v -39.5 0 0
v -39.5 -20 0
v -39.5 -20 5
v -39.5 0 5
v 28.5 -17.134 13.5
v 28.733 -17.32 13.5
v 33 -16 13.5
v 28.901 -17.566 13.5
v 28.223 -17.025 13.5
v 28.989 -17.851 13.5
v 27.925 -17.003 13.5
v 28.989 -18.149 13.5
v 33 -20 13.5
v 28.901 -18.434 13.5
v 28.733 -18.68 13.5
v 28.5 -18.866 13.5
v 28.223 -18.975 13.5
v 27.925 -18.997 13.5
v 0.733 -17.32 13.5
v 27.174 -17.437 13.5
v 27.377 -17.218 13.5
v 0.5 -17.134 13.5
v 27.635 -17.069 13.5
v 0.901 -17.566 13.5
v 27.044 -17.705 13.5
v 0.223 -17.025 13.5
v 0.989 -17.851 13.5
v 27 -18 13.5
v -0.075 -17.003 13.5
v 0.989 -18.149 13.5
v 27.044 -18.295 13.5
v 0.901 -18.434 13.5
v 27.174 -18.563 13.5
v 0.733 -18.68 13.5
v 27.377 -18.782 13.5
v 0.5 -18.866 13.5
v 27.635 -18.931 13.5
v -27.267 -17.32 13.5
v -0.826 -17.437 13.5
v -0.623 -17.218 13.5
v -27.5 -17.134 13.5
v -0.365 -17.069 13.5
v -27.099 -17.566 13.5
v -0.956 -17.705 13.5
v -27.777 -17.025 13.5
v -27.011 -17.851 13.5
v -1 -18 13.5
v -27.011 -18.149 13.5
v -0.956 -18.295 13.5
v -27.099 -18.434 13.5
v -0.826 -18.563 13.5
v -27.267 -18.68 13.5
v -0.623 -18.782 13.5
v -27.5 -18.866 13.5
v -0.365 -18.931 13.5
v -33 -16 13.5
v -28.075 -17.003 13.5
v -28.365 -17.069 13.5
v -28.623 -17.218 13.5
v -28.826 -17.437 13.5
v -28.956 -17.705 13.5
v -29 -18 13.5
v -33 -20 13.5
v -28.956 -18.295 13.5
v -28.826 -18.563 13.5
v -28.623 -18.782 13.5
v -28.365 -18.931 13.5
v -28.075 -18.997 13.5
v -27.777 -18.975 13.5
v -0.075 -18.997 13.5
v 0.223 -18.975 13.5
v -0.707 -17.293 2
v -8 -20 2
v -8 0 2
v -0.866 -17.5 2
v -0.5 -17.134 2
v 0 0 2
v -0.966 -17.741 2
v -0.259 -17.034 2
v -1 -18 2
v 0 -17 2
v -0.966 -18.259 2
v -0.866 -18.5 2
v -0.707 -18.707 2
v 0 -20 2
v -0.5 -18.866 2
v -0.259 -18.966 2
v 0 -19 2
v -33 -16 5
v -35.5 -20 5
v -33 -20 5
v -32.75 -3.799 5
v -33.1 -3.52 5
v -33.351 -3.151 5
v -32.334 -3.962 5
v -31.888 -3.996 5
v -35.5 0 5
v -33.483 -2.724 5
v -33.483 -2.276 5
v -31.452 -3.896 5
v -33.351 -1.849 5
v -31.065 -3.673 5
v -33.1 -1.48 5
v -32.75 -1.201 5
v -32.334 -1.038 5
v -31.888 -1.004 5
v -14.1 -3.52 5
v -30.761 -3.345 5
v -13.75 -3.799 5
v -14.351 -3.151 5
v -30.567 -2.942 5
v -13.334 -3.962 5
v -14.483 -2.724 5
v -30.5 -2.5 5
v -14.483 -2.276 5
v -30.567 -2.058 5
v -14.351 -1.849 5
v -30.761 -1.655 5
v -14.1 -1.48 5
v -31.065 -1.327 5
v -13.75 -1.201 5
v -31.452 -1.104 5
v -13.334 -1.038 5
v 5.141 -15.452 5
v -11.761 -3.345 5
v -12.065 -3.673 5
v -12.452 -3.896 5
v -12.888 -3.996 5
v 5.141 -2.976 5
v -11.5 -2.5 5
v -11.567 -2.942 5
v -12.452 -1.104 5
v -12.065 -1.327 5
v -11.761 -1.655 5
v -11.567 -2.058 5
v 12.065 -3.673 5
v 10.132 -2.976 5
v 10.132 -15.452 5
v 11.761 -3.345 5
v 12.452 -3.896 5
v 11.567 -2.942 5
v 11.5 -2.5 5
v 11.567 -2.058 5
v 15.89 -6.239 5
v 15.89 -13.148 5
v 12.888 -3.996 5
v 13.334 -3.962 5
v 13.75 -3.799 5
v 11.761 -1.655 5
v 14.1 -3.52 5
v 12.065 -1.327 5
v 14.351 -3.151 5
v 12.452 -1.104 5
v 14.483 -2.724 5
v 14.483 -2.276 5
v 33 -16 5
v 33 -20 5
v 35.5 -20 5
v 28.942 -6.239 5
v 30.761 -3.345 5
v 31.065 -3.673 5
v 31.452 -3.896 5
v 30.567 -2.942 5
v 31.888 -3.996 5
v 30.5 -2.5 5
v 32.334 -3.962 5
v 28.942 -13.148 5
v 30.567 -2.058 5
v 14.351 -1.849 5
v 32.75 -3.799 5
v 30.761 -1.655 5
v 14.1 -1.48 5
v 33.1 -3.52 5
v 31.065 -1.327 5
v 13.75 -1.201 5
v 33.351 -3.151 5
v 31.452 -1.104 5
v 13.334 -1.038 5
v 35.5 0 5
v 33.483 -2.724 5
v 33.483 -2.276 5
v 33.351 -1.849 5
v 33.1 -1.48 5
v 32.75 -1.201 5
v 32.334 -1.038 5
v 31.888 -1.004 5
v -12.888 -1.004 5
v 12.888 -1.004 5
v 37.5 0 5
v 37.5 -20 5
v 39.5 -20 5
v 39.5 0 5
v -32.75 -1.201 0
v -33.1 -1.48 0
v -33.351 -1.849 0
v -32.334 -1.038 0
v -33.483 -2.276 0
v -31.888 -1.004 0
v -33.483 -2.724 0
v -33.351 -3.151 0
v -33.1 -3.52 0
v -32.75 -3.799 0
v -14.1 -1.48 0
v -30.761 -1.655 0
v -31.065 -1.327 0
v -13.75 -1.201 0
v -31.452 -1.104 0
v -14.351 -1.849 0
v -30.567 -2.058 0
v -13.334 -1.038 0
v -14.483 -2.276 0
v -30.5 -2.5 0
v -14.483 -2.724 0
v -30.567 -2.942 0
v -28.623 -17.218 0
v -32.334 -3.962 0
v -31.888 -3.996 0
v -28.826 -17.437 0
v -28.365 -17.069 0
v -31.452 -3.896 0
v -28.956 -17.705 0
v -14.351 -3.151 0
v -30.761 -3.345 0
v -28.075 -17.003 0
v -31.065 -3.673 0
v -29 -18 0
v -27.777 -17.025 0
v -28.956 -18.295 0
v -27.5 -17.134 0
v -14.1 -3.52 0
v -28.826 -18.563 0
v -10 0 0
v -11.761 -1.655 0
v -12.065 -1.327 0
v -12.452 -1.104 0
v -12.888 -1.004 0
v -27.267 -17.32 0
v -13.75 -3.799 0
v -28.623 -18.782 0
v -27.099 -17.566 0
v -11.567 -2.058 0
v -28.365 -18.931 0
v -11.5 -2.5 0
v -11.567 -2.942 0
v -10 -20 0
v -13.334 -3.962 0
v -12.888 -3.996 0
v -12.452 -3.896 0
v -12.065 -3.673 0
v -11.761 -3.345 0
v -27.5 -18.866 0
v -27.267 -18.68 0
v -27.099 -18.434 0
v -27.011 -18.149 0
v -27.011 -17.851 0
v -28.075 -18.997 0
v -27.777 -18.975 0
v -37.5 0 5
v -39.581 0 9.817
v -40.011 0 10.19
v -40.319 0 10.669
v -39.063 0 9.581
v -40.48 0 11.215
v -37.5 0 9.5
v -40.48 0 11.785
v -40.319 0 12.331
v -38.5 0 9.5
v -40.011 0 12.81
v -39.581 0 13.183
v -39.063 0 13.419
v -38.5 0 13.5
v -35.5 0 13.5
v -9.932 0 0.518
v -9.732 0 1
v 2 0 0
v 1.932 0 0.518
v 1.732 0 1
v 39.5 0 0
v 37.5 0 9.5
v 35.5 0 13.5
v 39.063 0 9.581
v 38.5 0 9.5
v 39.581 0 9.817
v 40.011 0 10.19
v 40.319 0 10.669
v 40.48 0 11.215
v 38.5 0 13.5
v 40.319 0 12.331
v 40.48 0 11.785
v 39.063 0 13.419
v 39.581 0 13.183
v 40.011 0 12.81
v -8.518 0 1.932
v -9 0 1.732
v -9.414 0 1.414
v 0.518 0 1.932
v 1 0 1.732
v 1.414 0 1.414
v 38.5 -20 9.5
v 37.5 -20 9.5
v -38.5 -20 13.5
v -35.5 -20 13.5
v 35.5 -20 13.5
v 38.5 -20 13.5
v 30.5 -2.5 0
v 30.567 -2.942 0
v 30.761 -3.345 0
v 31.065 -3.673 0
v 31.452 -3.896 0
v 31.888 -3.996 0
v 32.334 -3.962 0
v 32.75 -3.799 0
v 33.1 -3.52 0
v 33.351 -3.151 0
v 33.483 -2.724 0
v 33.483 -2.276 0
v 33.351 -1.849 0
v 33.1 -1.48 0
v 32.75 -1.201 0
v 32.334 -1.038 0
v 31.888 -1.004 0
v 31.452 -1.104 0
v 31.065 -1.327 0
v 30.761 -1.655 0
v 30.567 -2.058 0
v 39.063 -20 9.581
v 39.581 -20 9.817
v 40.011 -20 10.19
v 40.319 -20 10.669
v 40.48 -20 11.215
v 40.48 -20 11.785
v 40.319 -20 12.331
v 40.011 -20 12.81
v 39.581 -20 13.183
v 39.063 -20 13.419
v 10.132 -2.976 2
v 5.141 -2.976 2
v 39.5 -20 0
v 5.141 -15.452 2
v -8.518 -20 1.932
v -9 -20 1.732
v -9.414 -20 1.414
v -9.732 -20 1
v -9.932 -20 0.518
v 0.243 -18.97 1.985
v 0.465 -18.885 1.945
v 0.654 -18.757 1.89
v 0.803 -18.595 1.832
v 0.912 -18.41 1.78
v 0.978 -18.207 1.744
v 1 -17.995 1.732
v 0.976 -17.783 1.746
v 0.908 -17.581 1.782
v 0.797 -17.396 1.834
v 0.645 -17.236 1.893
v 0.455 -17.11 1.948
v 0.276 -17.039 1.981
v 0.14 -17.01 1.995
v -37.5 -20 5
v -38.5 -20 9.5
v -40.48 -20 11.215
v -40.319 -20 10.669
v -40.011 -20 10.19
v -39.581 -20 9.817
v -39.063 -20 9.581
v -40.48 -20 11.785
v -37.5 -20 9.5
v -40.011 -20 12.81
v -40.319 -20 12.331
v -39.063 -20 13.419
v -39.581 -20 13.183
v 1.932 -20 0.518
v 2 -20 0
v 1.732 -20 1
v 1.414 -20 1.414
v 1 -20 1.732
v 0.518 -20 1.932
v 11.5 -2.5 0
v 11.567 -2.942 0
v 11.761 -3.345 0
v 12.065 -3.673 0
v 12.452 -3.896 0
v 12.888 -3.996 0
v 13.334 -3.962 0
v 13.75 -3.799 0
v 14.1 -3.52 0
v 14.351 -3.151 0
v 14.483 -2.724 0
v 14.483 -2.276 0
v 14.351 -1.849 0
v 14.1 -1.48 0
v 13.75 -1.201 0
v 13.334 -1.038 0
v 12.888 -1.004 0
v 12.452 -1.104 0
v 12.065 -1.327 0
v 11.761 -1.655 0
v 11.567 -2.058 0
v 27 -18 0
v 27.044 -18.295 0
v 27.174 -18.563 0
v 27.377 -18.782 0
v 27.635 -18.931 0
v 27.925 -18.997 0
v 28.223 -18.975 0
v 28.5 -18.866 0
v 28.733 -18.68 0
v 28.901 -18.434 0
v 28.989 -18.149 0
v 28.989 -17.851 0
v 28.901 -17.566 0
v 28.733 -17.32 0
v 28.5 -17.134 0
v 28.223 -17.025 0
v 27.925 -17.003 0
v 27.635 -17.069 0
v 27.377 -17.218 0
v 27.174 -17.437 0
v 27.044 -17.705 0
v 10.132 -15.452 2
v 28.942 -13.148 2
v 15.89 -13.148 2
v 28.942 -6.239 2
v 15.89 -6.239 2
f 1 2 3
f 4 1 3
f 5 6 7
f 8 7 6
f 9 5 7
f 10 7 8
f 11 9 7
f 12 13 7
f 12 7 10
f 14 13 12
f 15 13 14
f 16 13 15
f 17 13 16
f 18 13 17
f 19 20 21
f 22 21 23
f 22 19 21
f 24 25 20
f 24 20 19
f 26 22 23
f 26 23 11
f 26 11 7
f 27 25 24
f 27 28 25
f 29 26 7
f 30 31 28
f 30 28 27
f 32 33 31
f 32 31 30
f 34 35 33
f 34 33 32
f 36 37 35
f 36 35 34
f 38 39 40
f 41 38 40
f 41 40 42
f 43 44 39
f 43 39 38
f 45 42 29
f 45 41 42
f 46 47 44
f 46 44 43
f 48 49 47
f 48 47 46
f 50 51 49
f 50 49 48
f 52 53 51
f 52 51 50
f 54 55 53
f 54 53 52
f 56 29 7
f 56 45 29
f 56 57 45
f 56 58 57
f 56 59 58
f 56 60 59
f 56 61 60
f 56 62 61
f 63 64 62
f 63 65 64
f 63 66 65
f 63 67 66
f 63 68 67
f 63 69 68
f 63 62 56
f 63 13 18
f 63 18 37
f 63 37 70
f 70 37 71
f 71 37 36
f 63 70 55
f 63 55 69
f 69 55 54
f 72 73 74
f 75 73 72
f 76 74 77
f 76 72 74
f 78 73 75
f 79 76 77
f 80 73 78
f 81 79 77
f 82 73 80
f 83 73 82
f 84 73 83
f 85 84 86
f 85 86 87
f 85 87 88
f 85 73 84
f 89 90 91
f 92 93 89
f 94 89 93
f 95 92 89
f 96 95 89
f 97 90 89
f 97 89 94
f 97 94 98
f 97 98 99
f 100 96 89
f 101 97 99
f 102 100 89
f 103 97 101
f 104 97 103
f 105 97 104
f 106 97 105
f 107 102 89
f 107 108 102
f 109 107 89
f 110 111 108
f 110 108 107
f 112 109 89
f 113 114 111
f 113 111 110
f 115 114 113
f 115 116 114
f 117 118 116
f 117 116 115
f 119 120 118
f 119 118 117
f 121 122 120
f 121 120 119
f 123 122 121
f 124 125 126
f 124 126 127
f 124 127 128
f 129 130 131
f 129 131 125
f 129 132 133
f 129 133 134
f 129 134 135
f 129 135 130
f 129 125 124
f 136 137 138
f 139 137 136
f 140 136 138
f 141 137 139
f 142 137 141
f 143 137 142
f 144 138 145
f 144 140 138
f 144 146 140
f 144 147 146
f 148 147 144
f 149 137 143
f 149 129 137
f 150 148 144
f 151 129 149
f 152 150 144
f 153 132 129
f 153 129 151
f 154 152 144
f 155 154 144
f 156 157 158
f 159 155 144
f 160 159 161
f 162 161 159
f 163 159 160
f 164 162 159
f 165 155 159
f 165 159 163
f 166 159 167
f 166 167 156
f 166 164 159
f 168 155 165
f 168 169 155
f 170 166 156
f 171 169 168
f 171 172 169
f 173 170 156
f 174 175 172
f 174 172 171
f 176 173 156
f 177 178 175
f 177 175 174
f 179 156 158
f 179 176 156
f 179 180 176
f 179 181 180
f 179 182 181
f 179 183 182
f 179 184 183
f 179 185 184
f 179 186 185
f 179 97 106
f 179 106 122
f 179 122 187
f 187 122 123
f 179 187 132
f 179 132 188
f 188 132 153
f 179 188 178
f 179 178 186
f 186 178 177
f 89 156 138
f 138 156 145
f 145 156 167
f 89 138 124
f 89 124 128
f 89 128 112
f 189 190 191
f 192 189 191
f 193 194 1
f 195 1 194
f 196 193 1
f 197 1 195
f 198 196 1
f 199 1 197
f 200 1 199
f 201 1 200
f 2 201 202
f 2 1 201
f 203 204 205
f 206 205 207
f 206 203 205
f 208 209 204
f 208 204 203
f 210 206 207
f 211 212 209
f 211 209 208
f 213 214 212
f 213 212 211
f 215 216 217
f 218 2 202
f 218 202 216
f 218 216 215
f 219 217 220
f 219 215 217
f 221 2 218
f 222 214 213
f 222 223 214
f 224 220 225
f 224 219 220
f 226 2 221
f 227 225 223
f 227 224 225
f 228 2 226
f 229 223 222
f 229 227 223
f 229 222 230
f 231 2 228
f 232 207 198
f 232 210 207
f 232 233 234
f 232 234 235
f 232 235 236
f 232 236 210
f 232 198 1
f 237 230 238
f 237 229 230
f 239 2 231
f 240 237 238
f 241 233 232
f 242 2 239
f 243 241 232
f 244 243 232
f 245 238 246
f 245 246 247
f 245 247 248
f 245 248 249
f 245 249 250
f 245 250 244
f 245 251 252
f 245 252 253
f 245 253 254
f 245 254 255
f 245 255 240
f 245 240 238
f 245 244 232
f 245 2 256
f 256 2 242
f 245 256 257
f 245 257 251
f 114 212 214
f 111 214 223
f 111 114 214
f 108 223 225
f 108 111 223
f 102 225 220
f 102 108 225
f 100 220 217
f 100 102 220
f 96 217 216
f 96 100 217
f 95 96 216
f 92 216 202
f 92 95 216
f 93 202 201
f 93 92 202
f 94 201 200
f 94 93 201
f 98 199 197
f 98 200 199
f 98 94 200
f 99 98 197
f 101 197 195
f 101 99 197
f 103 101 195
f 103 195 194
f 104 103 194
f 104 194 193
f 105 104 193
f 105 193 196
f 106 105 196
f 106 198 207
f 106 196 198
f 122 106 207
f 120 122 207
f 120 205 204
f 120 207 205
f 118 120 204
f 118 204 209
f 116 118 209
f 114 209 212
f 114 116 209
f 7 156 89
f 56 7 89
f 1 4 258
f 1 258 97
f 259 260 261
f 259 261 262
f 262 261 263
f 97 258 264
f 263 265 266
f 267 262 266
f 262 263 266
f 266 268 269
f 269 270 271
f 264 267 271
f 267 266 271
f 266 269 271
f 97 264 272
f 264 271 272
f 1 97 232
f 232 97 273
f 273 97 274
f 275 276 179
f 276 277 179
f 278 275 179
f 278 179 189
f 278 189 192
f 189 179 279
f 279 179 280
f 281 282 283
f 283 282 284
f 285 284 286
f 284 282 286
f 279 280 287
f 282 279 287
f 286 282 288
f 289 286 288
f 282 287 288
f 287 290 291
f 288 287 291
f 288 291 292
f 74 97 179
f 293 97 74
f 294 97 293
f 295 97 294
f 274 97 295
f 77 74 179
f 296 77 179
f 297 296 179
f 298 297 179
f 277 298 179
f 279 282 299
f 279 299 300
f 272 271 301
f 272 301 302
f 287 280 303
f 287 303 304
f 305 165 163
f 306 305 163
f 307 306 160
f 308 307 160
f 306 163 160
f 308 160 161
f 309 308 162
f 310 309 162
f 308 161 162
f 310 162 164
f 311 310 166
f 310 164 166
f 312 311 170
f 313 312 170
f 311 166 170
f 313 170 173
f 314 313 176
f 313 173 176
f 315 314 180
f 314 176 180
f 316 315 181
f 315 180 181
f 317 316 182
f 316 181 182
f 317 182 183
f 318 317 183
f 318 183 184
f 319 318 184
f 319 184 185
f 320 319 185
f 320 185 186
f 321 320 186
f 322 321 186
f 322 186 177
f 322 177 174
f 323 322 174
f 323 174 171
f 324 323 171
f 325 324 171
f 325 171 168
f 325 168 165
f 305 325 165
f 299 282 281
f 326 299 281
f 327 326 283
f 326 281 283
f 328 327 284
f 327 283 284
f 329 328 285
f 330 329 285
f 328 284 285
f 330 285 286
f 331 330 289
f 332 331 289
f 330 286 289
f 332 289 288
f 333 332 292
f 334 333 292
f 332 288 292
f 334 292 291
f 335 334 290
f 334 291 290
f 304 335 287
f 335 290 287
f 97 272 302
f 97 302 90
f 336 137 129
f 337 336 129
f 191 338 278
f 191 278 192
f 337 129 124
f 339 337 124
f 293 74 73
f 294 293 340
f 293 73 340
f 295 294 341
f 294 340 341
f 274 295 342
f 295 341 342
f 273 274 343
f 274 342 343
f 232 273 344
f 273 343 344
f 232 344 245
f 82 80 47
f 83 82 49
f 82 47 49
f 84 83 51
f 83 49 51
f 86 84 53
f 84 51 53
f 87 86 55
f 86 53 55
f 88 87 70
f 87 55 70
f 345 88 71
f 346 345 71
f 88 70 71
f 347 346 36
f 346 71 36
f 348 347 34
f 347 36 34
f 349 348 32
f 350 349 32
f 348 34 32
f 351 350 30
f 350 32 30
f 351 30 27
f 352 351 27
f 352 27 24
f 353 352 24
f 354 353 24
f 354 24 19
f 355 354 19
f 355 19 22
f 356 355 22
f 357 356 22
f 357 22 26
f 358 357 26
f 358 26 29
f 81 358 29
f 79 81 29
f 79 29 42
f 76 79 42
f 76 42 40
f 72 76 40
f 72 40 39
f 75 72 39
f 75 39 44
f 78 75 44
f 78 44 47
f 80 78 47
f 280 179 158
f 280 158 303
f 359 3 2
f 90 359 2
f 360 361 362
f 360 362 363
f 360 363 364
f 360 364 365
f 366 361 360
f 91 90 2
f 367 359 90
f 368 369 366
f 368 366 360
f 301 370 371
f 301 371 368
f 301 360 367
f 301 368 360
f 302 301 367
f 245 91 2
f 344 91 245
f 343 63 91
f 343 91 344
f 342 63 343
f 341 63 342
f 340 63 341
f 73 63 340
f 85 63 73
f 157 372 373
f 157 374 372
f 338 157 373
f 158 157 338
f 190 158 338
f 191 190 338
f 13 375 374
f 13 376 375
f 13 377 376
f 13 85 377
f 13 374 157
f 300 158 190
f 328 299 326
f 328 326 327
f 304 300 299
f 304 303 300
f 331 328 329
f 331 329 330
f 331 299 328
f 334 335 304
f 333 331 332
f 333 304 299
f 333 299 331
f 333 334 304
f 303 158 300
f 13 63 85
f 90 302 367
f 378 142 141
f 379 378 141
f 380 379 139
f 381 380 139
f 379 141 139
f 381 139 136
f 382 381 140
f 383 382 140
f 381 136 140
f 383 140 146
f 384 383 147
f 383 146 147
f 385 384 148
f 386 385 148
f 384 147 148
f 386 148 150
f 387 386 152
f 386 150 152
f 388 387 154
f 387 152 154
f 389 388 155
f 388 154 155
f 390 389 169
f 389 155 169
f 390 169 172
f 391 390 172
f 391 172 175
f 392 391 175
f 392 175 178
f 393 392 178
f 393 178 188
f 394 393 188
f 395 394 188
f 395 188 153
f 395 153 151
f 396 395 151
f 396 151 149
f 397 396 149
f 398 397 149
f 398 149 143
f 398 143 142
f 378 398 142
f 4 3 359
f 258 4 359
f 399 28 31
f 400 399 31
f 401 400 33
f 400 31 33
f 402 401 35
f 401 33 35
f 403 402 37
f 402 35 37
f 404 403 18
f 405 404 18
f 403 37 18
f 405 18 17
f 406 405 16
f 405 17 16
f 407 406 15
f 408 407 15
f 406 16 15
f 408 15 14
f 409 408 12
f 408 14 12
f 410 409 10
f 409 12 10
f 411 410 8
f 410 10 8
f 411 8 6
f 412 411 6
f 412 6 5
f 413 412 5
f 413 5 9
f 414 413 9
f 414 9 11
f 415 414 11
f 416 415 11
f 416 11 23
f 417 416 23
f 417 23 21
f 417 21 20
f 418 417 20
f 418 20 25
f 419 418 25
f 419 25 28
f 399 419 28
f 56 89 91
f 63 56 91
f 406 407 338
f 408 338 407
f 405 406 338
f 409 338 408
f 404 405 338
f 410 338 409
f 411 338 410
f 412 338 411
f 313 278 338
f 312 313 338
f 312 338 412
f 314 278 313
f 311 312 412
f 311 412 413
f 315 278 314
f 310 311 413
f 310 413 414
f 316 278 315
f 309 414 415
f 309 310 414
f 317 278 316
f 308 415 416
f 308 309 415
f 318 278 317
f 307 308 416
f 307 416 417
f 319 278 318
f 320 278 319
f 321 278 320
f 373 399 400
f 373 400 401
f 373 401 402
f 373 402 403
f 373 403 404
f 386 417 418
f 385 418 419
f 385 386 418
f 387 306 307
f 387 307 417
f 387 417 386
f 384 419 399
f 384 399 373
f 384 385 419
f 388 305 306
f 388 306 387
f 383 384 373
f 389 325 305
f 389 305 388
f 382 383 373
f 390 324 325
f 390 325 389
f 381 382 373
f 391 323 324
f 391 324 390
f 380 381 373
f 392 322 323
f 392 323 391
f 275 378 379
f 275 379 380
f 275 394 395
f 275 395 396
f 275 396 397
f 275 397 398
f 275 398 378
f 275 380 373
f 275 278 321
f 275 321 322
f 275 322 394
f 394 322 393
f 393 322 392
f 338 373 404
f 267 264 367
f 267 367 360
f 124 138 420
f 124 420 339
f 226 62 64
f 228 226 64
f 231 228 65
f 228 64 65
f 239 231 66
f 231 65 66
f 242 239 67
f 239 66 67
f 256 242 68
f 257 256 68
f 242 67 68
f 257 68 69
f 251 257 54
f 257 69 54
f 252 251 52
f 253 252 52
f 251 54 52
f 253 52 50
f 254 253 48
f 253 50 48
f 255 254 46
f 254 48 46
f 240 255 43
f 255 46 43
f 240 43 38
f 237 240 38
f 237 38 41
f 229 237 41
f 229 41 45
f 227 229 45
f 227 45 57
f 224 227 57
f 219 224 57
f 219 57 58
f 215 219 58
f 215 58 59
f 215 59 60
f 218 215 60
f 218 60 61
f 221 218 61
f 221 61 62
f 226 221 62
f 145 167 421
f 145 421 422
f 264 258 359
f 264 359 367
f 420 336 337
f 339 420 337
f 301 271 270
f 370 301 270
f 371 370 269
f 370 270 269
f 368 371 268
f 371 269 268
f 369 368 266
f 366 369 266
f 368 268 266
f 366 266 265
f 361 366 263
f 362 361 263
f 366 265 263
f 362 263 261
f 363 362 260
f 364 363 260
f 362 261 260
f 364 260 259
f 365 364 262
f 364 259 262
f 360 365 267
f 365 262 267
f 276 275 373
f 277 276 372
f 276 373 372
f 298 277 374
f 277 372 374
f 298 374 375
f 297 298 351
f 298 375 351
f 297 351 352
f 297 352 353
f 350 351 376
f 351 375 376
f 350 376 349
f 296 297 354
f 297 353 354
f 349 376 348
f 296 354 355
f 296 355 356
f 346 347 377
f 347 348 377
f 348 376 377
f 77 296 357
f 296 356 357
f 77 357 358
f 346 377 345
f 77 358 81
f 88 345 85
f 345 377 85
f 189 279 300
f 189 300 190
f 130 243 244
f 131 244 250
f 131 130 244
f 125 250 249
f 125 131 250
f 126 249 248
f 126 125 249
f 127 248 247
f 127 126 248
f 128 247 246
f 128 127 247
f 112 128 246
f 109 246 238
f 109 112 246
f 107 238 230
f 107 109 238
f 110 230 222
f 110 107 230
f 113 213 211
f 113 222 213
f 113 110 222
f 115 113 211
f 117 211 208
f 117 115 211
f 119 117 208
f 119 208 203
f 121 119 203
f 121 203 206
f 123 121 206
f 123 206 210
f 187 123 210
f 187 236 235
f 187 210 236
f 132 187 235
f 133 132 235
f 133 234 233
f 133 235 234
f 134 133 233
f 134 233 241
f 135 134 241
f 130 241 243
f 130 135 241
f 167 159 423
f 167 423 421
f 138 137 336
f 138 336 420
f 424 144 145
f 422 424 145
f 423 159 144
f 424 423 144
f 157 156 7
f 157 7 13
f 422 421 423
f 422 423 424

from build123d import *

# Parameters (mm, degrees)
PAD_DEPTH       = 20
SKETCH001_R     = 1.5
POCKET_DEPTH    = 174.036499
POCKET001_DEPTH = 20.001
SKETCH003_W     = 13.051827
SKETCH003_H     = 6.909791
SKETCH003_W_2   = 4.990405
SKETCH003_H_2   = 12.476008
POCKET002_DEPTH = 3
SKETCH004_W     = 2
SKETCH004_H     = 5
PAD001_DEPTH    = 20
SKETCH005_W     = 66
SKETCH005_H     = 4
PAD002_DEPTH    = 8.5
SKETCH006_R     = 1
POCKET003_DEPTH = 13.501


with BuildPart() as part:
    # Sketch → Pad (new body)
    with BuildSketch(Plane.XZ):
        with BuildLine():
            Line((-35.5, 5), (35.5, 5))
            Line((35.5, 5), (35.5, 13.5))
            Line((35.5, 13.5), (38.5, 13.5))
            ThreePointArc((38.5, 9.5), (40.5, 11.5), (38.5, 13.5))
            Line((38.5, 9.5), (37.5, 9.5))
            Line((37.5, 9.5), (37.5, 0))
            Line((37.5, 0), (-37.5, 0))
            Line((-37.5, 0), (-37.5, 9.5))
            Line((-37.5, 9.5), (-38.5, 9.5))
            ThreePointArc((-38.5, 13.5), (-40.5, 11.5), (-38.5, 9.5))
            Line((-38.5, 13.5), (-35.5, 13.5))
            Line((-35.5, 13.5), (-35.5, 5))
        make_face()
    extrude(amount=PAD_DEPTH)

    # Sketch001 (on Face3 of Pad) → Pocket (cut, through all)
    with BuildSketch(Plane(origin=(0, 0, 5), x_dir=(-1, 0, 0), z_dir=(0, 0, 1))):
        with Locations((-13, 2.5)):
            Circle(SKETCH001_R)
        with Locations((-32, 2.5)):
            Circle(SKETCH001_R)
    pocket = extrude(amount=-POCKET_DEPTH, mode=Mode.SUBTRACT)

    # Mirrored: Pocket across Sketch001 V_Axis
    add(pocket.mirror(Plane(origin=(0, 0, 5), x_dir=(0, 0, 1), z_dir=(-1, 0, 0))), mode=Mode.SUBTRACT)

    # Sketch002 (on Face5 of Mirrored) → Pocket001 (cut, through all)
    with BuildSketch(Plane.XZ.offset(20)):
        with BuildLine():
            ThreePointArc((-8, 2), (-10, 0), (-8, -2))
            Line((-8, -2), (0, -2))
            ThreePointArc((0, -2), (2, 0), (0, 2))
            Line((-8, 2), (0, 2))
        make_face()
    extrude(amount=-POCKET001_DEPTH, mode=Mode.SUBTRACT)

    # Sketch003 → Pocket002 (cut)
    with BuildSketch(Plane(origin=(0, 0, 5), x_dir=(-1, 0, 0), z_dir=(0, 0, 1))):
        with Locations((-22.41574, 9.693542)):
            Rectangle(SKETCH003_W, SKETCH003_H)
        with Locations((-7.636473, 9.213694)):
            Rectangle(SKETCH003_W_2, SKETCH003_H_2)
    extrude(amount=-POCKET002_DEPTH, mode=Mode.SUBTRACT)

    # Sketch004 (on Face5 of Pocket002) → Pad001 (join)
    with BuildSketch(Plane.XZ.offset(20)):
        with Locations((-38.5, 2.5)):
            Rectangle(SKETCH004_W, SKETCH004_H)
        with Locations((38.5, 2.5)):
            Rectangle(SKETCH004_W, SKETCH004_H)
    extrude(amount=-PAD001_DEPTH)

    # Sketch005 (on Face7 of Pad001) → Pad002 (join)
    with BuildSketch(Plane(origin=(0, 0, 5), x_dir=(-1, 0, 0), z_dir=(0, 0, 1))):
        with Locations((0, 18)):
            Rectangle(SKETCH005_W, SKETCH005_H)
    extrude(amount=PAD002_DEPTH)

    # Sketch006 (on Face37 of Pad002) → Pocket003 (cut, through all)
    with BuildSketch(Plane(origin=(0, 0, 13.5), x_dir=(-1, 0, 0), z_dir=(0, 0, 1))):
        with Locations((0, 18)):
            Circle(SKETCH006_R)
        with Locations((28, 18)):
            Circle(SKETCH006_R)
        with Locations((-28, 18)):
            Circle(SKETCH006_R)
    extrude(amount=-POCKET003_DEPTH, mode=Mode.SUBTRACT)


solid = part.part
